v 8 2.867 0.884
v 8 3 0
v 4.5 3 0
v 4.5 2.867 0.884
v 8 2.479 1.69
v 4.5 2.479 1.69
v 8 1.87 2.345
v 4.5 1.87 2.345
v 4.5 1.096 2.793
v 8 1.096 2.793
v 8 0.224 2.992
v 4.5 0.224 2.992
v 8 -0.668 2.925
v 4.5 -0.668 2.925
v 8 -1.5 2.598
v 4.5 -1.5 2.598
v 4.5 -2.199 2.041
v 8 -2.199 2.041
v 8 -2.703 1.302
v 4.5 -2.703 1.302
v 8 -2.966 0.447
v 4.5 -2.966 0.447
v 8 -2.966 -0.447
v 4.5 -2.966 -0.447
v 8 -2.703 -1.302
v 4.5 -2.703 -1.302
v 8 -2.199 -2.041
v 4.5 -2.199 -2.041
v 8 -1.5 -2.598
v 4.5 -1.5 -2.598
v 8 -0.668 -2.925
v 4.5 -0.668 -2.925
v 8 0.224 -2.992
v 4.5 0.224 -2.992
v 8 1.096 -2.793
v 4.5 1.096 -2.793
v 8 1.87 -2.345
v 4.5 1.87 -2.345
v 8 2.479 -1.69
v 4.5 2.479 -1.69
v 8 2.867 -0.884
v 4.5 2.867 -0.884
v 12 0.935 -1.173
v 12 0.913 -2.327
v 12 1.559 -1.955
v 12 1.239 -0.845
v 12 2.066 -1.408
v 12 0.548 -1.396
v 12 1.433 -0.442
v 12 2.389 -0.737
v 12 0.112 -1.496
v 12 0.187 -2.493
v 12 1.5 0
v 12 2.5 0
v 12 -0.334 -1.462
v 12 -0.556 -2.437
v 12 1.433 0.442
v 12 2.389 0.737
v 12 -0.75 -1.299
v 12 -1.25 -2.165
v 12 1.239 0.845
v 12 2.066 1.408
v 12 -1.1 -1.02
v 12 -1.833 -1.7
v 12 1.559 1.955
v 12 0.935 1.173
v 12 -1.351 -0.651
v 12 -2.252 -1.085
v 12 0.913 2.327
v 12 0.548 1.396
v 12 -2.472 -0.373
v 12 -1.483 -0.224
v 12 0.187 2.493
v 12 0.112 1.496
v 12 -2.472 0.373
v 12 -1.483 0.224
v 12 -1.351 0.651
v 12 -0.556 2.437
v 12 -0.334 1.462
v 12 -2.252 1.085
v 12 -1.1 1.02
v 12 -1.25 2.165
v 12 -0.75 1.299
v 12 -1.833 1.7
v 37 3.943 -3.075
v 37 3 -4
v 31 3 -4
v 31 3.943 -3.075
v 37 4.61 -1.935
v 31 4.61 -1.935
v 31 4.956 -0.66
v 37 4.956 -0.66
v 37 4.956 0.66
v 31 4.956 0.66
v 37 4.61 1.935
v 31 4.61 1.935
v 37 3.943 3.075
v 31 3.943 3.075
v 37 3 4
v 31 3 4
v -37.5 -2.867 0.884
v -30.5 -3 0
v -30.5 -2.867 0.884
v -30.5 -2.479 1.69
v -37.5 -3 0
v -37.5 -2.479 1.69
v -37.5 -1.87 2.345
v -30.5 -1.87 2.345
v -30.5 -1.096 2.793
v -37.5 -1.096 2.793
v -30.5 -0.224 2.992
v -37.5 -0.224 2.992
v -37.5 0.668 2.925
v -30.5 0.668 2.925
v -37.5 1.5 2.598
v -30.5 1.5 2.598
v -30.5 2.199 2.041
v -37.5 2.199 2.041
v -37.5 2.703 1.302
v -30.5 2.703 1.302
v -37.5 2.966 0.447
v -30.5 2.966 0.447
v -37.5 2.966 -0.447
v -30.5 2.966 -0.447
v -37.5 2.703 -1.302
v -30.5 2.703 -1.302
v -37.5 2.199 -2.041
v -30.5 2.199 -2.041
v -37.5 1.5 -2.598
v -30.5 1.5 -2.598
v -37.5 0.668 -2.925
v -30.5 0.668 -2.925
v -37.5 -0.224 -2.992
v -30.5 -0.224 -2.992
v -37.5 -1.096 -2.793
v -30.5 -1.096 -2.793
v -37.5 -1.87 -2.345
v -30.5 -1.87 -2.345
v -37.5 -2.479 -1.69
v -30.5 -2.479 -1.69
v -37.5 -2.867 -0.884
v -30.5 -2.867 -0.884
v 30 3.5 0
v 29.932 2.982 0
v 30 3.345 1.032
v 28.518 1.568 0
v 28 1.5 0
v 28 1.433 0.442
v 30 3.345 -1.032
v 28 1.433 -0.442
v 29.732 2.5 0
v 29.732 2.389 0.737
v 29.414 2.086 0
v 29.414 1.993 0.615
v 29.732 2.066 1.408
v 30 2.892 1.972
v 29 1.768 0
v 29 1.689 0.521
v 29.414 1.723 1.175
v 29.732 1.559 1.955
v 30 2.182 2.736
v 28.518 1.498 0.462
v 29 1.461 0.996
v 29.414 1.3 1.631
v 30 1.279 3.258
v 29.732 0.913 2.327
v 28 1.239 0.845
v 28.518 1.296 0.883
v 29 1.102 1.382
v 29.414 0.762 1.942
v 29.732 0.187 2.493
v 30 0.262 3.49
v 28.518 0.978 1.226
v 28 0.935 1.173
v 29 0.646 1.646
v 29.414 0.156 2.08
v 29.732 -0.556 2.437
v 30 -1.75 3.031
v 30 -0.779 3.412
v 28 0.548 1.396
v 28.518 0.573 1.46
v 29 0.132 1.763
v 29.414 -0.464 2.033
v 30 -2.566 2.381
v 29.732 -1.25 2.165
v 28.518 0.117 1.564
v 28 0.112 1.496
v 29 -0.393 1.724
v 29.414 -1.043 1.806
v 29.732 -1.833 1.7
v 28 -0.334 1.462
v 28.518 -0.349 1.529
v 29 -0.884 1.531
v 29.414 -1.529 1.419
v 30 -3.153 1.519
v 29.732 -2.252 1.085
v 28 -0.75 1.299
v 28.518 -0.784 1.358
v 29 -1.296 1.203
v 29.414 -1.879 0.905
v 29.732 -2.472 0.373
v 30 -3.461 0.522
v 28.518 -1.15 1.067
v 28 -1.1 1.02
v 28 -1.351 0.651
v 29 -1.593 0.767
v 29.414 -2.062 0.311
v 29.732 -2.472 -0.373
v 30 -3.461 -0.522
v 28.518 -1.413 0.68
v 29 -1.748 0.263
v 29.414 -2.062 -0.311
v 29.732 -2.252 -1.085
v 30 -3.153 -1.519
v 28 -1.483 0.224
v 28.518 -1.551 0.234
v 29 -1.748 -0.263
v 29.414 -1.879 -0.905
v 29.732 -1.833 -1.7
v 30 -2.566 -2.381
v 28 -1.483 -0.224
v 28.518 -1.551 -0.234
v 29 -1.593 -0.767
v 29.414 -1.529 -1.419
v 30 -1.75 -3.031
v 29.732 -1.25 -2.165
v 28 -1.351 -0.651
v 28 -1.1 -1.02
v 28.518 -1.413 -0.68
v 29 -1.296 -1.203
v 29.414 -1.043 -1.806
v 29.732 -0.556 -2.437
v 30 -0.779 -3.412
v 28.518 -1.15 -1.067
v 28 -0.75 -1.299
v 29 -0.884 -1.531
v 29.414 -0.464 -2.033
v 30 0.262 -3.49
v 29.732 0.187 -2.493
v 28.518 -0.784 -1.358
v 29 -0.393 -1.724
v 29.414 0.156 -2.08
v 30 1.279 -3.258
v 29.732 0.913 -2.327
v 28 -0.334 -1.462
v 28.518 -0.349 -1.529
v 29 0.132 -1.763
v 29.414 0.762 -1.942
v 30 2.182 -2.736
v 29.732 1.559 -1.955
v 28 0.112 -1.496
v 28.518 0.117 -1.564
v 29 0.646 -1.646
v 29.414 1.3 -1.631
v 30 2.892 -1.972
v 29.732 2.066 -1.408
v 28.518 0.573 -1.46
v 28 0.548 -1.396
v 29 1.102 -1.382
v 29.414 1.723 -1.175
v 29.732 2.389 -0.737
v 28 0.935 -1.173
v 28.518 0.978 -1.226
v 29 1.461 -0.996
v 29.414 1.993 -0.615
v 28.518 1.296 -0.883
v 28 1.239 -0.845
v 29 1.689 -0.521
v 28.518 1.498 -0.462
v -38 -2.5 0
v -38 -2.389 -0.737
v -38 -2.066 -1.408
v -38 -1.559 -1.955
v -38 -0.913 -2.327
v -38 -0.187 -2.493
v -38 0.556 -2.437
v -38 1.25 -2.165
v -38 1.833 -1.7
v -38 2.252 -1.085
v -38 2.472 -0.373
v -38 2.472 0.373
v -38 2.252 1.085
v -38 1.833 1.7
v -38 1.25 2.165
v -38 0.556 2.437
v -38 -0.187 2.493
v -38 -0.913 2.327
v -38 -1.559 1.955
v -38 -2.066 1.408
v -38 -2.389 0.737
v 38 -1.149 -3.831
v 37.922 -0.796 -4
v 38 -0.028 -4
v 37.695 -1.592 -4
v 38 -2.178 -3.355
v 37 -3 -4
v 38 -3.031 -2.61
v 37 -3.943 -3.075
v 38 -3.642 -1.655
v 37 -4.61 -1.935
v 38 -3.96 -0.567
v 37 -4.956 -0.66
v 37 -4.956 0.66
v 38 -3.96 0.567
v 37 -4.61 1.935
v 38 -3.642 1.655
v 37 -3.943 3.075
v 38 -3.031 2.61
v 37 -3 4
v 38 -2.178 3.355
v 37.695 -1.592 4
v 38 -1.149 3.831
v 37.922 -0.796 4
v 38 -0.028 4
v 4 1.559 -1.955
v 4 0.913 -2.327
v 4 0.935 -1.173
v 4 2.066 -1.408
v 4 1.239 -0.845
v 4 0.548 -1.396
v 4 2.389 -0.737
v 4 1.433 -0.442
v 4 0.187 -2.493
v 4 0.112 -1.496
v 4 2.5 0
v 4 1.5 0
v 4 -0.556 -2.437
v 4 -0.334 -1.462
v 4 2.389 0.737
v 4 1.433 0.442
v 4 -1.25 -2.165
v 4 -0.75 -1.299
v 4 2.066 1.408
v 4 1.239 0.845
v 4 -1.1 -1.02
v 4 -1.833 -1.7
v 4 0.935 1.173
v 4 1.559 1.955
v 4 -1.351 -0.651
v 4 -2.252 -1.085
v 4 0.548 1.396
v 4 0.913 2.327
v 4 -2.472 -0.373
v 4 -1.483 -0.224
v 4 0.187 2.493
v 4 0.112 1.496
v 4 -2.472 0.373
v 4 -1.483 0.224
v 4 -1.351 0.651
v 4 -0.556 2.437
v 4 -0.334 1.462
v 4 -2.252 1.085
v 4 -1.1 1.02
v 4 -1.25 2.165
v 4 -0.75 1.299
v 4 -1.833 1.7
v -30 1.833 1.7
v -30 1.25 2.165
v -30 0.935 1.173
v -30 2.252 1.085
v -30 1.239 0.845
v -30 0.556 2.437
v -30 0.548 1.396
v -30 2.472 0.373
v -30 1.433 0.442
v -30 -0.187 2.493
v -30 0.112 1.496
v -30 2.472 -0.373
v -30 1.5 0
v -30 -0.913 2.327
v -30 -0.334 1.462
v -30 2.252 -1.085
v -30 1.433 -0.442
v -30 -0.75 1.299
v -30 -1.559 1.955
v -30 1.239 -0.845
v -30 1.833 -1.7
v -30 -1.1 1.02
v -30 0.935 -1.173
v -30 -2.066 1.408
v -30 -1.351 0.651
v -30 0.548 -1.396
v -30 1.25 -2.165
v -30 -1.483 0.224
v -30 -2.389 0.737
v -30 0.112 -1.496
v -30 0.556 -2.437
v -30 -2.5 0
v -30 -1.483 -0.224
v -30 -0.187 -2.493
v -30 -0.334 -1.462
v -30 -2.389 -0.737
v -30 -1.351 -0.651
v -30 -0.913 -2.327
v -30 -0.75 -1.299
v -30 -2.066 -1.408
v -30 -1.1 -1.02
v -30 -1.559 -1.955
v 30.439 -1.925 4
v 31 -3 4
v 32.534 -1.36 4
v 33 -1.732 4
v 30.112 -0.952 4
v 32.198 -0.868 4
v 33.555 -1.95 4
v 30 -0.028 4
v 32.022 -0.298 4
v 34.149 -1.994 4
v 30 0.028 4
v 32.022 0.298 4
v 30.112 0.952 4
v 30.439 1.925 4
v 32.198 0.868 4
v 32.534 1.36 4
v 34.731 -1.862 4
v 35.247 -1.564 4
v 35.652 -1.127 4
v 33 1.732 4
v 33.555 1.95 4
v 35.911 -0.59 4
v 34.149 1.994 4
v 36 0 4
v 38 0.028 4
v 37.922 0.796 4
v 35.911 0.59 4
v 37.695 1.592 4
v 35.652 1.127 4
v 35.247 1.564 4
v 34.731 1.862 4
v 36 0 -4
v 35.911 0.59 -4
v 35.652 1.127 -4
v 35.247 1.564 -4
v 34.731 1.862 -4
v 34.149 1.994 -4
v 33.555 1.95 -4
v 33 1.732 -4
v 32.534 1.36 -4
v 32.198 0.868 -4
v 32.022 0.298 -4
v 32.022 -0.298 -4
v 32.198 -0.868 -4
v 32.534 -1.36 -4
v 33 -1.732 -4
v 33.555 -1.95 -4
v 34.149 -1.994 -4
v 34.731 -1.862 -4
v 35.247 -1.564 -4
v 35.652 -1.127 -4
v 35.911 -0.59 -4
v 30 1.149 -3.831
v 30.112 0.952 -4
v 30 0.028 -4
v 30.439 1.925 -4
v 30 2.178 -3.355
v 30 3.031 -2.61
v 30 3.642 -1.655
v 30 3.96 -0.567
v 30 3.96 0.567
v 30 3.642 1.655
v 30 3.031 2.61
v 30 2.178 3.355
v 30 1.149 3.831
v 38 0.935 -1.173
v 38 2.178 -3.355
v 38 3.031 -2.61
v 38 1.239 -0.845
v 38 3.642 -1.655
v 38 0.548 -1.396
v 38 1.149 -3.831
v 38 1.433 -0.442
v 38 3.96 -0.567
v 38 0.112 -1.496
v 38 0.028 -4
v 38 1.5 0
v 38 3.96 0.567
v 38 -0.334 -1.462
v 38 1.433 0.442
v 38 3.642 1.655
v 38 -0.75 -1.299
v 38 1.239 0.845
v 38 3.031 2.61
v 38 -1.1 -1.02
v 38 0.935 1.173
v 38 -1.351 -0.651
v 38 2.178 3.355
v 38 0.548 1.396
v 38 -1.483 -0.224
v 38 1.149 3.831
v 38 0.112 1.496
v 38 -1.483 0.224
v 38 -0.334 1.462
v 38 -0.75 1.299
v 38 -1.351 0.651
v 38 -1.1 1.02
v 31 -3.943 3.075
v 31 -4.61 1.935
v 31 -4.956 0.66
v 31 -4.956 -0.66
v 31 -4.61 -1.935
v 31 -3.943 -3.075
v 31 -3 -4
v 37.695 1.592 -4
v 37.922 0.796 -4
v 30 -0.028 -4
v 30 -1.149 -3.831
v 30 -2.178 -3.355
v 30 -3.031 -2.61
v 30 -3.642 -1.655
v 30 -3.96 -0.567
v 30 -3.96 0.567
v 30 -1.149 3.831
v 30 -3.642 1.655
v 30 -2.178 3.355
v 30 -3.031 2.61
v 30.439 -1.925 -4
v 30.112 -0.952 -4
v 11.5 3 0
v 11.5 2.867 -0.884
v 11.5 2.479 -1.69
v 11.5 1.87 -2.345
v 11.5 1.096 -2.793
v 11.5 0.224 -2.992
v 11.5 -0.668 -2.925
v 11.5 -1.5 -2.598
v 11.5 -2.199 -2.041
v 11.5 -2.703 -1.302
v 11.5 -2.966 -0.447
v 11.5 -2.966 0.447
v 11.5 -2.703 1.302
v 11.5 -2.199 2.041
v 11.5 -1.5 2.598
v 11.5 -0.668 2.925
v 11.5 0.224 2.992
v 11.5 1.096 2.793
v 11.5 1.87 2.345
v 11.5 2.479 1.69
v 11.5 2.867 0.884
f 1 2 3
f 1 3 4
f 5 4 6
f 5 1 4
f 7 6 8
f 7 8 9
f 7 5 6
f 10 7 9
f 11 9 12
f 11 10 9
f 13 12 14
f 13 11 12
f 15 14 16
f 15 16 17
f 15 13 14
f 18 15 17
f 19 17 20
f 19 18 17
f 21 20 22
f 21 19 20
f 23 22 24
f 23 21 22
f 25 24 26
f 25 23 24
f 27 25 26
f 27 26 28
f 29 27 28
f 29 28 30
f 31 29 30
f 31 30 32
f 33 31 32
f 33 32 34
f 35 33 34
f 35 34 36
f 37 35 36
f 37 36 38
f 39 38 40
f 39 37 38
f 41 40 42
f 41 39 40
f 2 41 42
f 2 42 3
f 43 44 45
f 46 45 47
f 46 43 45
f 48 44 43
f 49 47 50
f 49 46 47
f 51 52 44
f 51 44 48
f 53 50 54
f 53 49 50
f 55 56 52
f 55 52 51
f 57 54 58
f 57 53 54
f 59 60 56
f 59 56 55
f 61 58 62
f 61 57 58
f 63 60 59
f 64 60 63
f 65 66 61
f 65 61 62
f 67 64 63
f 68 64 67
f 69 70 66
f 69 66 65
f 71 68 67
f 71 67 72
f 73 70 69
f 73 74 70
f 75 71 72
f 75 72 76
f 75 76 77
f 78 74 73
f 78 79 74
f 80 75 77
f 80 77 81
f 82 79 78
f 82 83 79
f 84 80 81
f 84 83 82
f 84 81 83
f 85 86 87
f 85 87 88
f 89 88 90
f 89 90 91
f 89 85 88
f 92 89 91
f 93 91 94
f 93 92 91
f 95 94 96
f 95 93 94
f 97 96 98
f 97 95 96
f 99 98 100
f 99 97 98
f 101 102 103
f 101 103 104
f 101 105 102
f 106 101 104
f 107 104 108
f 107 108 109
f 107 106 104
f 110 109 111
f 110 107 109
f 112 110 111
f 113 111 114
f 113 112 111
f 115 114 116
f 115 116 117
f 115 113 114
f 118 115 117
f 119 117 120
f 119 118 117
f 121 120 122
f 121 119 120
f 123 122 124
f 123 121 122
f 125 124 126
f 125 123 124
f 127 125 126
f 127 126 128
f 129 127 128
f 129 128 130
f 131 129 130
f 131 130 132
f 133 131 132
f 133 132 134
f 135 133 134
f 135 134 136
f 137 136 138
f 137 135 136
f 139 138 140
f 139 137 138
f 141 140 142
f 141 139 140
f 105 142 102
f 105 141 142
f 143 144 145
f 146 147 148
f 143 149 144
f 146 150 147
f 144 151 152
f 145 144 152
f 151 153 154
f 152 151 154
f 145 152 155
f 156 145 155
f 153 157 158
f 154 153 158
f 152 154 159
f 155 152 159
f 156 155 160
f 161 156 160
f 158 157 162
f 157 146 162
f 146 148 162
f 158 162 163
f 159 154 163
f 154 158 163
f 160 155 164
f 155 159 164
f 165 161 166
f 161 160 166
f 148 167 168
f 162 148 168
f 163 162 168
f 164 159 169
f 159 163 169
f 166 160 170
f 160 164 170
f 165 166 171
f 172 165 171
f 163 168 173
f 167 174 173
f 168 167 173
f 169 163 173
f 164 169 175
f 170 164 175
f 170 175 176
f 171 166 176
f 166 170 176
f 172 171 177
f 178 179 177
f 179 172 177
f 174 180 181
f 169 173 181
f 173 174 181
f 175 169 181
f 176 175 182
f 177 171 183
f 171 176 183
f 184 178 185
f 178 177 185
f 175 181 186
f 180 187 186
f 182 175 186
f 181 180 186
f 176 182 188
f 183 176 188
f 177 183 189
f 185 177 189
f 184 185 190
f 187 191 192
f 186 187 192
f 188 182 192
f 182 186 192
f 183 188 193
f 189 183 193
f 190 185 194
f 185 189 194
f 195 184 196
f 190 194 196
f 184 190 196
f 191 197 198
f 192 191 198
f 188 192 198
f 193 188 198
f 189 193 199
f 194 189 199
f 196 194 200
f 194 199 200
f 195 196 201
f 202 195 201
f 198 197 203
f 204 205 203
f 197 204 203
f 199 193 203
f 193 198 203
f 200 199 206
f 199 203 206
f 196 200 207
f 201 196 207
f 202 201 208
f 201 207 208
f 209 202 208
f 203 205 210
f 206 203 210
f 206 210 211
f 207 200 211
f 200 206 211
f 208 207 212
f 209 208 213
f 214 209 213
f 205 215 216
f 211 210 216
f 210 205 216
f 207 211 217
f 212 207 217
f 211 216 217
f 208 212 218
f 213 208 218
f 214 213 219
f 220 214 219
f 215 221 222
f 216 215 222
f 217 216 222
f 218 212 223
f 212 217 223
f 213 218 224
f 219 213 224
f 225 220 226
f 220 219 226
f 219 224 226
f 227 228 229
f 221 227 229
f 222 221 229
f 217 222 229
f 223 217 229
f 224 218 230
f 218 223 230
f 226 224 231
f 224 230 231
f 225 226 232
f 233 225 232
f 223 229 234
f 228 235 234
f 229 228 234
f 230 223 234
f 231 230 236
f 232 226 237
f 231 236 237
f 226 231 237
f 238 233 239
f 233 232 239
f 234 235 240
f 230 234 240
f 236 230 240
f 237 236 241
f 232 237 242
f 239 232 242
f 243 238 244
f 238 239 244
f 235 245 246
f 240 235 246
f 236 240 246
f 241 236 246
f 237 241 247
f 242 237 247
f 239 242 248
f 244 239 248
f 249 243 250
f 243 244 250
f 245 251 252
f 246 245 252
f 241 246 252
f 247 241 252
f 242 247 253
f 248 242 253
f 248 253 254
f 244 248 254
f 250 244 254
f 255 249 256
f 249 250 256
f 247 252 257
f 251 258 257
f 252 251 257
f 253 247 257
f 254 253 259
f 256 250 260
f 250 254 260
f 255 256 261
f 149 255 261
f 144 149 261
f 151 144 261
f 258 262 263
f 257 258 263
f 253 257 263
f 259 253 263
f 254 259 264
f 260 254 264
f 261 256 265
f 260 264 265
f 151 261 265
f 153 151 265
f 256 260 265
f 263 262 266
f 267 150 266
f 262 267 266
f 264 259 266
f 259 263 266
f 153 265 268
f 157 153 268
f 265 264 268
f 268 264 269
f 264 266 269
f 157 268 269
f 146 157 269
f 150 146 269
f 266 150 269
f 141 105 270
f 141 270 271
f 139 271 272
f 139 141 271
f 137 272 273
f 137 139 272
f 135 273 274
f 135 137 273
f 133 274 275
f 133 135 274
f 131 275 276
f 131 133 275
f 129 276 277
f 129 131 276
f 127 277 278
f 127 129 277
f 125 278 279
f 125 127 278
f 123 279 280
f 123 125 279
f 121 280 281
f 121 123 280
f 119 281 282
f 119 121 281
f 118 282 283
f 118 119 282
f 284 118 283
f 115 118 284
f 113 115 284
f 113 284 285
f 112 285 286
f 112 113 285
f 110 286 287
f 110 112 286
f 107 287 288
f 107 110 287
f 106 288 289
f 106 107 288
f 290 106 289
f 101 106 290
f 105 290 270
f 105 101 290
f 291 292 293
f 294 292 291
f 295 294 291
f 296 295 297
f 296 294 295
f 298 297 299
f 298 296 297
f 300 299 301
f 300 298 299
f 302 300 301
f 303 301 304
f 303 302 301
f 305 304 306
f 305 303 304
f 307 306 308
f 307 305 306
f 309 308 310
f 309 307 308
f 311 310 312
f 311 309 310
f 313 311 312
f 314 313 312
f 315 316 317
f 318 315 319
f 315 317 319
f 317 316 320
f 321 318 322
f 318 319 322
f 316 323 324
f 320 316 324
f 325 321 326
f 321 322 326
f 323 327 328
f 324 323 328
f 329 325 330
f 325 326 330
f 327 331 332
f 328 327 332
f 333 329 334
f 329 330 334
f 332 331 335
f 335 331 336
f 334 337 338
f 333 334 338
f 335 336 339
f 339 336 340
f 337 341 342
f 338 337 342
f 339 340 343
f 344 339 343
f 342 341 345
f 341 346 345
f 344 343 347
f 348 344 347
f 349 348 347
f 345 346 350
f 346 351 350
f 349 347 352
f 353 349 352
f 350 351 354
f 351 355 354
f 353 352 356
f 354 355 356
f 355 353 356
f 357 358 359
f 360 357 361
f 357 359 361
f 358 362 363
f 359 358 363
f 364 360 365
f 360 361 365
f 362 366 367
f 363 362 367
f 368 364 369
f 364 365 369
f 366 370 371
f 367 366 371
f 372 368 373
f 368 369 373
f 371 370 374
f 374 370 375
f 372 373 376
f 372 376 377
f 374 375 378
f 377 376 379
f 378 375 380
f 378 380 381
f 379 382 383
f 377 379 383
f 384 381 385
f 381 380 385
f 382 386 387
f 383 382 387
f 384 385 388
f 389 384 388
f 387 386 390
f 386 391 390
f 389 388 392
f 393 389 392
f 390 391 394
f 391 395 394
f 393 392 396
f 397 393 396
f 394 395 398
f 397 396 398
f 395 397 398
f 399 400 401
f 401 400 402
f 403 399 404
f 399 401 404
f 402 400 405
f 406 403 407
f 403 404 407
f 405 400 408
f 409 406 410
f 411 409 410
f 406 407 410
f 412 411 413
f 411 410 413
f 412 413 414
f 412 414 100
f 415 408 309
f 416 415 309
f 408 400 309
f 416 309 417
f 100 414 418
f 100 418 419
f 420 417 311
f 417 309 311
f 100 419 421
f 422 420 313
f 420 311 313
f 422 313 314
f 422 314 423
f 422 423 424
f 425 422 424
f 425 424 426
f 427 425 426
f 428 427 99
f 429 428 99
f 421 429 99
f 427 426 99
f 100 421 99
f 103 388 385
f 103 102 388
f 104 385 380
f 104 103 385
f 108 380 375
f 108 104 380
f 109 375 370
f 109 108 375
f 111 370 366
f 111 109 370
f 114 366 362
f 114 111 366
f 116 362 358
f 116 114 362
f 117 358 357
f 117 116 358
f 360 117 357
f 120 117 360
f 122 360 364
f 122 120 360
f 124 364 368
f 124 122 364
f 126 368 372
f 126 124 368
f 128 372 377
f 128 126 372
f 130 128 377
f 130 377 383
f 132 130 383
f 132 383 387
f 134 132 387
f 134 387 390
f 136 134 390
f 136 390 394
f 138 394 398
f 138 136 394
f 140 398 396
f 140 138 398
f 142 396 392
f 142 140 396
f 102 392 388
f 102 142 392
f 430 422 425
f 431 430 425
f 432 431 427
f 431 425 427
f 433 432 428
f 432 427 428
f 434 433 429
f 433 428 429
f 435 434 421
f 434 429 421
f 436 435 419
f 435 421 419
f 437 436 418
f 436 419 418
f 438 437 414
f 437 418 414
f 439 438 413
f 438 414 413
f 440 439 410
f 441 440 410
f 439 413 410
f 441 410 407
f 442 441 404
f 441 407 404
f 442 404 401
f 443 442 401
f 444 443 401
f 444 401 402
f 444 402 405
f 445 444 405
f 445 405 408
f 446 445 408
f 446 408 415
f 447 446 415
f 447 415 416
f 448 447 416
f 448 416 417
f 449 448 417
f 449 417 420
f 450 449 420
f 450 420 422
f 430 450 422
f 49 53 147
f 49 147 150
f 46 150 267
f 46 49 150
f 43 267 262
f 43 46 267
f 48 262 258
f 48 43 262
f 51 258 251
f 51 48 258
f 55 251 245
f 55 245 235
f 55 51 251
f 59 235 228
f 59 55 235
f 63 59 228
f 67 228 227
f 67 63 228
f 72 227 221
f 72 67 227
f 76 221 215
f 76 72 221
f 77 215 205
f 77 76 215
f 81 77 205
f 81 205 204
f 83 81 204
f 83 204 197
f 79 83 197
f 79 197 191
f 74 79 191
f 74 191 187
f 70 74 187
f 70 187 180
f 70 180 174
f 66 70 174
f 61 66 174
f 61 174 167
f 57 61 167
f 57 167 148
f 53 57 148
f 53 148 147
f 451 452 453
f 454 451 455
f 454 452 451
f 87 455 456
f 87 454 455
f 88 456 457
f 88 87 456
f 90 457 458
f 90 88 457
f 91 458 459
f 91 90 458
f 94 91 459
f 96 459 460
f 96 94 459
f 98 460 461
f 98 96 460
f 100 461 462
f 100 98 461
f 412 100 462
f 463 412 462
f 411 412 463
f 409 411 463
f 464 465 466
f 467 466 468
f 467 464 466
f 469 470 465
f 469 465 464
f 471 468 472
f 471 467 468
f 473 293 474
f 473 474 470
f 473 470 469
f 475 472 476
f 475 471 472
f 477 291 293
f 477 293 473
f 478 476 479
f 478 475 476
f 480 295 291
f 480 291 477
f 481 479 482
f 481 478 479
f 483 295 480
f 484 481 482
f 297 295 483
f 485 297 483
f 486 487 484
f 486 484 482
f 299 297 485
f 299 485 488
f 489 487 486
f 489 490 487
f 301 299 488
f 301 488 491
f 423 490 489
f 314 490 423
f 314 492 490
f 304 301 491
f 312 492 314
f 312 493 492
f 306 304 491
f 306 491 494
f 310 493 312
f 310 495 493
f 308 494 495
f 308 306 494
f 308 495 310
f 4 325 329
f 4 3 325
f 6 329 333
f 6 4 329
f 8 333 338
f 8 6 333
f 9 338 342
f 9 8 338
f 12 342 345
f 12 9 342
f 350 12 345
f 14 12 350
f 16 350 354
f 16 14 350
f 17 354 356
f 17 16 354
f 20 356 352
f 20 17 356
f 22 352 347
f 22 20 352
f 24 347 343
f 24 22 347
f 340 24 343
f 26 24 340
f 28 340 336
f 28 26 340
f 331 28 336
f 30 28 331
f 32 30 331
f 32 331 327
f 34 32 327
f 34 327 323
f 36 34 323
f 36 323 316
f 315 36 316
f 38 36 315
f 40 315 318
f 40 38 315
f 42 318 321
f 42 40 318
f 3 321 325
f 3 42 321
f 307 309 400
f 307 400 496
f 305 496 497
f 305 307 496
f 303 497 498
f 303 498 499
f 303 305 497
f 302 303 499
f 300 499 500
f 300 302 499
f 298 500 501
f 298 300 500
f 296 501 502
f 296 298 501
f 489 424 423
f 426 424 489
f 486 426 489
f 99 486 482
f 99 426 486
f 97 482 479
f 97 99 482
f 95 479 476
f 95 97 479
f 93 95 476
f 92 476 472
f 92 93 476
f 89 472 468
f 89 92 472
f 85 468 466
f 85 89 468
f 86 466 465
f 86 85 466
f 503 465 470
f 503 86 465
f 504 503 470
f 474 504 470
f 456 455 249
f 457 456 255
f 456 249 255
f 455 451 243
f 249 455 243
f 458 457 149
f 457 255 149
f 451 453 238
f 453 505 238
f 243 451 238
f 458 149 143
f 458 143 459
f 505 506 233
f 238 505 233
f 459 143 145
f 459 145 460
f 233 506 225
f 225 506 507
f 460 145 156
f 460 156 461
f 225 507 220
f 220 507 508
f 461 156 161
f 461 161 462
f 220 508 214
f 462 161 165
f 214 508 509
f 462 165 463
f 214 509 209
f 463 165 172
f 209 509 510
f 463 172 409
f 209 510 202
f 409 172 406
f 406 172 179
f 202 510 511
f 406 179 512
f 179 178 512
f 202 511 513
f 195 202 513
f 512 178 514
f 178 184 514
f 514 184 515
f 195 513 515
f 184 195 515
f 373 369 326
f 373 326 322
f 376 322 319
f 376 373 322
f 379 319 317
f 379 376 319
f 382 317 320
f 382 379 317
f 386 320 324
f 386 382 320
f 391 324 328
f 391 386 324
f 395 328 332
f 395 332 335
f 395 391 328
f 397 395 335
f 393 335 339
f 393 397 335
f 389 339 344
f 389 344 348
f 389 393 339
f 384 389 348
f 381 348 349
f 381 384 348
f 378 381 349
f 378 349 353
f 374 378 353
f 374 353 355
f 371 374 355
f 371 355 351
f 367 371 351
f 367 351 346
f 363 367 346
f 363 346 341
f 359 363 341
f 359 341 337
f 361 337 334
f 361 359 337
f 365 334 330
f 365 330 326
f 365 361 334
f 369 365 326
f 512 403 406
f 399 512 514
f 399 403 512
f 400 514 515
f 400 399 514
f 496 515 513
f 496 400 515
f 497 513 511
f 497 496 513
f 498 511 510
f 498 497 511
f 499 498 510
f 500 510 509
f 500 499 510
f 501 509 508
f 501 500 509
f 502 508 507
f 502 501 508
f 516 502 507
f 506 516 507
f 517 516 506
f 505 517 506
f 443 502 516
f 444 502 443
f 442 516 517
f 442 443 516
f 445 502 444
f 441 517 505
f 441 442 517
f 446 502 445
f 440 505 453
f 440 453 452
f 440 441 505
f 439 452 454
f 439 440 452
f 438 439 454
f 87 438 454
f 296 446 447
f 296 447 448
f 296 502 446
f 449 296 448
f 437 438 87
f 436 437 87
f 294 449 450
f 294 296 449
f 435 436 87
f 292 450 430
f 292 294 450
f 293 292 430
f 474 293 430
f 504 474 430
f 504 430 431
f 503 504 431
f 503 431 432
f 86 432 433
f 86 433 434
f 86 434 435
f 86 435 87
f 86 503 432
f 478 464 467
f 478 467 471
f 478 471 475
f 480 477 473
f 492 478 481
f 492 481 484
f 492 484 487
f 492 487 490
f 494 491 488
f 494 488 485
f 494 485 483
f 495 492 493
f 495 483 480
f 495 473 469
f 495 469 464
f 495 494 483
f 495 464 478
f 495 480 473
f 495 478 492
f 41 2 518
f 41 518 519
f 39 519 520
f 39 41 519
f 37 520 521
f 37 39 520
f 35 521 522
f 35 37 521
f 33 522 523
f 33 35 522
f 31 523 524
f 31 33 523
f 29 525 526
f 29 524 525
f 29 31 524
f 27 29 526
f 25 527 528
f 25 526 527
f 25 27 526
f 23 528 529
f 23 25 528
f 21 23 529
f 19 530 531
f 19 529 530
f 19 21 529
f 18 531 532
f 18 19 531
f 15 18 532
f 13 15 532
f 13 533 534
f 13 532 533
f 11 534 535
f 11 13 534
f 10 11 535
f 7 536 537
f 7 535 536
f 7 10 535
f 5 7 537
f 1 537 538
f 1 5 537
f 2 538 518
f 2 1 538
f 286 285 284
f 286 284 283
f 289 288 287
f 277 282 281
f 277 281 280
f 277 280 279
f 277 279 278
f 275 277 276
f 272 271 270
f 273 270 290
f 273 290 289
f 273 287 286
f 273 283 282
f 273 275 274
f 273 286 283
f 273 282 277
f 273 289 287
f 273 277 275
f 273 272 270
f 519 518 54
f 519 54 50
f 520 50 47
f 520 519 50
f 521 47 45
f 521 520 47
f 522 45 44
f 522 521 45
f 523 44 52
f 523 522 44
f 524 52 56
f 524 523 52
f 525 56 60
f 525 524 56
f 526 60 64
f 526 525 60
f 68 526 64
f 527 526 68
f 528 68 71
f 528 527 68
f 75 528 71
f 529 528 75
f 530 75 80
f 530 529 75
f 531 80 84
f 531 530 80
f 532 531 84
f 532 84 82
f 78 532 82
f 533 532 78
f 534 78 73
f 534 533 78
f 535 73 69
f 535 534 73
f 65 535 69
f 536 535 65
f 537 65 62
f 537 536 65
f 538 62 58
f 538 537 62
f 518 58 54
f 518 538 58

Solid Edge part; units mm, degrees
sketch "Sketch1" plane through (0, 0, 0) normal (1, 0, 0) x (0, 1, 0)
  circle A0 centre (0, 0) radius 1.5
extrude "Protrusion1" add sketch "Sketch1" along normal mid plane 76
sketch "Sketch2" plane through (-38, 0, 0) normal (-1, 0, 0) x (0, -1, 0)
  circle A0 centre (0, 0) radius 3
extrude "ExtrudedProtrusion_2" add sketch "Sketch2" against normal blind 8
sketch "Sketch3" plane through (8, 0, 0) normal (1, 0, 0) x (0, 1, 0)
  circle A0 centre (0, 0) radius 3
extrude "ExtrudedProtrusion_3" add sketch "Sketch3" along normal mid plane 8
chamfer "Chamfer_1" distance 0.5 angle 45 4 edges at (-38, 3, 0) (-30, 3, 0) (12, -3, 0) (4, -3, 0)
sketch "Sketch4" plane through (38, 0, 0) normal (1, 0, 0) x (0, 0, -1)
  circle A0 centre (0, 0) radius 5
extrude "ExtrudedProtrusion_4" add sketch "Sketch4" against normal blind 8
sketch "Sketch5" plane through (38, 0, 0) normal (1, 0, 0) x (0, 0, -1)
  line L0 (-4, -3) -> (-4, 3)
  arc A0 (-4, -3) -> (-4, 3) centre (0, 0) cw
  line L1 (4, -3) -> (4, 3)
  arc A1 (4, 3) -> (4, -3) centre (0, 0) cw
extrude "ExtrudedCutout_1" cut sketch "Sketch5" against normal blind 9
sketch "Sketch6" plane through (34, 0, 4) normal (0, 0, 1) x (1, 0, 0)
  circle A0 centre (0, 0) radius 2
extrude "ExtrudedCutout_2" cut sketch "Sketch6" along normal mid plane 64.4682
chamfer "Chamfer_2" distance 1 angle 45 2 edges at (30, -5, 0) (38, -5, 0)
chamfer "Chamfer_3" distance 1 angle 45 2 edges at (30, 5, 0) (38, 5, 0)
fillet "Round_1" radius 2 1 edges at (30, 1.5, 0)
